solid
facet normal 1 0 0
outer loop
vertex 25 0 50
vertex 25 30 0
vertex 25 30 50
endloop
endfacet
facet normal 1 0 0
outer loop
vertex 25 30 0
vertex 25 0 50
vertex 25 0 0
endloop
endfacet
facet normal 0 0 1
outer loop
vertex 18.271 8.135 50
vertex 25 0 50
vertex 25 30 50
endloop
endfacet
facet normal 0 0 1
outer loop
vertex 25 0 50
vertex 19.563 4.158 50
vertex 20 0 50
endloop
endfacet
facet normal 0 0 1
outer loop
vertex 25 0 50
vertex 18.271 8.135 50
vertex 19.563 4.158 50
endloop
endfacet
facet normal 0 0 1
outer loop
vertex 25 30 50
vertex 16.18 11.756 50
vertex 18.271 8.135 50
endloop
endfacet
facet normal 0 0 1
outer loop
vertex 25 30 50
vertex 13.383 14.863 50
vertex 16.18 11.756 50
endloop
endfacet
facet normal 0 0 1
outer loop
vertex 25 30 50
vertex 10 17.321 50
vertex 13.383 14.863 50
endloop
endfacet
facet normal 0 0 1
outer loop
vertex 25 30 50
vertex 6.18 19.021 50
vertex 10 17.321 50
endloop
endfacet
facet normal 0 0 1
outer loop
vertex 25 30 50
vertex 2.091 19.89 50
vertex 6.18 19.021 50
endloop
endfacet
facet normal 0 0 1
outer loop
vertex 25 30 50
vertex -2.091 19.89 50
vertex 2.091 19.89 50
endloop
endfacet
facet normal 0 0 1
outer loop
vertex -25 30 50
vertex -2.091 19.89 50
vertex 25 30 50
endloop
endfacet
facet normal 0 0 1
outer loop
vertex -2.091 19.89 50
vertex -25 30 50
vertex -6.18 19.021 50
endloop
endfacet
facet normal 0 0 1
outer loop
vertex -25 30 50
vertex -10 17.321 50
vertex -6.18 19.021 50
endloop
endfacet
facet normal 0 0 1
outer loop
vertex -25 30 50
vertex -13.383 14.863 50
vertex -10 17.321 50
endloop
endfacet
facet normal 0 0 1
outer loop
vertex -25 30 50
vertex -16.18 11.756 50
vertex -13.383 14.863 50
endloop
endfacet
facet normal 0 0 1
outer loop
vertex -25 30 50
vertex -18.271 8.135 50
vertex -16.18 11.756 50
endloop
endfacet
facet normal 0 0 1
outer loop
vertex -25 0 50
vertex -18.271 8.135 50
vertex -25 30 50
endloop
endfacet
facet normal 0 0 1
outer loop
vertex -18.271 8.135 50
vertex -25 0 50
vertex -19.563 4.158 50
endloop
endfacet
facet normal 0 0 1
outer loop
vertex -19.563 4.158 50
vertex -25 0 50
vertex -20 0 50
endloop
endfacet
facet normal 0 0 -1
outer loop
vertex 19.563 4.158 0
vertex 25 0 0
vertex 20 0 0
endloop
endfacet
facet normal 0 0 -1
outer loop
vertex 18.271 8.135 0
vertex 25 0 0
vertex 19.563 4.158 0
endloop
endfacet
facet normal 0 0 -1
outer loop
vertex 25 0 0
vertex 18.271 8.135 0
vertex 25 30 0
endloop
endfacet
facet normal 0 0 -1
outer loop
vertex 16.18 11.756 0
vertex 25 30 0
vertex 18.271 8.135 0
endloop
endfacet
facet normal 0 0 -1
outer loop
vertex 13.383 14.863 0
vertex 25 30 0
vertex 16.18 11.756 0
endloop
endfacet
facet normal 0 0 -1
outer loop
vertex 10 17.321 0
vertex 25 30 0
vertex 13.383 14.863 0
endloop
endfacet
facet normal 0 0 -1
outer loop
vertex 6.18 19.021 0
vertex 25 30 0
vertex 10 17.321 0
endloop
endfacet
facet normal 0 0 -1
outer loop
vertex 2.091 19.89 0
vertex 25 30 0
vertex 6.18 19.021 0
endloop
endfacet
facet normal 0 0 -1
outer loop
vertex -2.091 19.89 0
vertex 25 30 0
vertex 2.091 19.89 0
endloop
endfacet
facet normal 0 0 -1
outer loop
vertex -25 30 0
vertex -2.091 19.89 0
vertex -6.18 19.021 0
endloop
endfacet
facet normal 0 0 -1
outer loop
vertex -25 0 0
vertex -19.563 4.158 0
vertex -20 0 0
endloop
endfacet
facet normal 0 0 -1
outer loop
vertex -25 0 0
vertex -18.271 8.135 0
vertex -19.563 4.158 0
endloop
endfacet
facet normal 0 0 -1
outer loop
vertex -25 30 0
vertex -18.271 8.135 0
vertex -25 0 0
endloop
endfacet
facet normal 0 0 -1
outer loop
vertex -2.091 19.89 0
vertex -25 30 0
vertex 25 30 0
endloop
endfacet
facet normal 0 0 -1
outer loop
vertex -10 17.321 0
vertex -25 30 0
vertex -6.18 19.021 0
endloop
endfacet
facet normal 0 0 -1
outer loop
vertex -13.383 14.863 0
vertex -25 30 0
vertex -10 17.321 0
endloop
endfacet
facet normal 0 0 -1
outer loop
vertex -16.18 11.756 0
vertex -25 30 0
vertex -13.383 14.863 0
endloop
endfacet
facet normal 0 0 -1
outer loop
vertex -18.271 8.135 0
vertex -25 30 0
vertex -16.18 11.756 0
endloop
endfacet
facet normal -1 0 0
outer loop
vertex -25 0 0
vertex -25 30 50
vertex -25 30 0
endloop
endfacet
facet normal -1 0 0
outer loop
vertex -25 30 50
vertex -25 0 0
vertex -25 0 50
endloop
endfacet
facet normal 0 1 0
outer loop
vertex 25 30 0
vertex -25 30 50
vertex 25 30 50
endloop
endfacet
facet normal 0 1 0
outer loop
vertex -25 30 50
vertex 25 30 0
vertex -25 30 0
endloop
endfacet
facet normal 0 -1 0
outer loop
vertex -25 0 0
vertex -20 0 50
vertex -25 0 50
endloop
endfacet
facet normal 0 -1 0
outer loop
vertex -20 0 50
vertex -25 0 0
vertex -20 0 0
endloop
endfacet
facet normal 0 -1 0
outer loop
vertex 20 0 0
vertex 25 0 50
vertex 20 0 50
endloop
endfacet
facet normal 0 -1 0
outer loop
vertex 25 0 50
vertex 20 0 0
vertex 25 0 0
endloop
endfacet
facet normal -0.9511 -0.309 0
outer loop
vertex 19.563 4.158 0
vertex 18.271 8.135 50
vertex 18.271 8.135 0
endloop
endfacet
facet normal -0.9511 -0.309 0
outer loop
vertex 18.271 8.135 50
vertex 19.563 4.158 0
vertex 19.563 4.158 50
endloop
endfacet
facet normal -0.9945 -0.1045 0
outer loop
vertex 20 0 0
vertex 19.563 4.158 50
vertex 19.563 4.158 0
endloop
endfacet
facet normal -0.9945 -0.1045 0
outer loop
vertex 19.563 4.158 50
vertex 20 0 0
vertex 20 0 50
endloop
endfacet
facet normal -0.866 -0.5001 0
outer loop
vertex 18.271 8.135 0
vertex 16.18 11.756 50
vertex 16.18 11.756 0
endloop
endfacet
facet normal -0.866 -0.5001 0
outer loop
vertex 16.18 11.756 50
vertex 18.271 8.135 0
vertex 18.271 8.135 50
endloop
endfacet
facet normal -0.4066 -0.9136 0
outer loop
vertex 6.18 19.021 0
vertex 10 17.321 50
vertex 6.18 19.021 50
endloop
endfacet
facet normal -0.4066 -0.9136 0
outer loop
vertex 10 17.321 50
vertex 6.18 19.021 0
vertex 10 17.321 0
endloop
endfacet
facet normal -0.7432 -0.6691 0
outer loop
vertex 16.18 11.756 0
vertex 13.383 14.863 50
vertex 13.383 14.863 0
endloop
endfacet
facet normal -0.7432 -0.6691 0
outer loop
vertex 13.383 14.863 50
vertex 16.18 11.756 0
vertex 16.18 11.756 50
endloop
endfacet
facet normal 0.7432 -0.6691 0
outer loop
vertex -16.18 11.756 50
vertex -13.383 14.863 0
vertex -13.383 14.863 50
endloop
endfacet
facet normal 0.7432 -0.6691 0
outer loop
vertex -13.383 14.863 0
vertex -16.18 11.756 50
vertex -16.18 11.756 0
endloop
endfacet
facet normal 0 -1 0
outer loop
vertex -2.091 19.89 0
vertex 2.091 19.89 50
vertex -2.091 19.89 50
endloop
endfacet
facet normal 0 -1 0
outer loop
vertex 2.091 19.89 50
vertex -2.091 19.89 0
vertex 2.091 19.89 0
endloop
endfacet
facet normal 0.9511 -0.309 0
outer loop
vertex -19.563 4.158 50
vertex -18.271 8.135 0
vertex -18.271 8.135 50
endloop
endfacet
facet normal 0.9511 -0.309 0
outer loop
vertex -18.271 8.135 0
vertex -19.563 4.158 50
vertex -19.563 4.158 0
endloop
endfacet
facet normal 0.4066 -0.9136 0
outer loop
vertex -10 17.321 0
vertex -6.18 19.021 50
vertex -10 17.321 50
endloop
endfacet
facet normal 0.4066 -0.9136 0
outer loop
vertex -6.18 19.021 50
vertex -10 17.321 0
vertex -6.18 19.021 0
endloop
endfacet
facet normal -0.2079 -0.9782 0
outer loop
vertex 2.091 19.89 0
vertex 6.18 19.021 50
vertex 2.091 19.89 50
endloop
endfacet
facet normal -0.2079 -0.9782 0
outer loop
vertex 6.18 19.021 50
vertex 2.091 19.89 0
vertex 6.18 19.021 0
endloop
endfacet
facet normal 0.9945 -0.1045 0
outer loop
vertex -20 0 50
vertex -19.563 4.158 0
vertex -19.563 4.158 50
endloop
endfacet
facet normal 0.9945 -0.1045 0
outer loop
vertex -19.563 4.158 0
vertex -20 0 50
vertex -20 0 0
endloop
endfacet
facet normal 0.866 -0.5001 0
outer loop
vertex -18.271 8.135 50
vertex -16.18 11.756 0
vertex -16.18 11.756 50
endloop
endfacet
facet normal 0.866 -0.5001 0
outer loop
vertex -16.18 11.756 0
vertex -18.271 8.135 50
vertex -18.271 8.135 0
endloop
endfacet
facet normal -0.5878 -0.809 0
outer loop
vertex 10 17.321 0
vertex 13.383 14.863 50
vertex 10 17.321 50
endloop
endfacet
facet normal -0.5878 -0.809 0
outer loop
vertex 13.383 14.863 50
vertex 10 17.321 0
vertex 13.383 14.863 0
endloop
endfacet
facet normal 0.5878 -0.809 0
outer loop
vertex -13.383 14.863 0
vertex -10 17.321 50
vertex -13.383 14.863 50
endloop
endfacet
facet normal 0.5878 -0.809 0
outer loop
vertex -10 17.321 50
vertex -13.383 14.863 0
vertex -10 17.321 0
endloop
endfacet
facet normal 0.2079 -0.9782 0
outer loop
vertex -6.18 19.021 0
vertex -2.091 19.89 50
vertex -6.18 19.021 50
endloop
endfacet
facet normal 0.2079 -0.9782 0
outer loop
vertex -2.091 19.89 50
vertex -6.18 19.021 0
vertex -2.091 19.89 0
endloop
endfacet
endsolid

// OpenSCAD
// 3D Shapes- Design Time: Halfpipe

difference() {
    translate([-25, 0, 0]) cube([50, 30, 50]);
    translate([0, 0, -1]) cylinder(h=60, r1=20, r2=20);
}
